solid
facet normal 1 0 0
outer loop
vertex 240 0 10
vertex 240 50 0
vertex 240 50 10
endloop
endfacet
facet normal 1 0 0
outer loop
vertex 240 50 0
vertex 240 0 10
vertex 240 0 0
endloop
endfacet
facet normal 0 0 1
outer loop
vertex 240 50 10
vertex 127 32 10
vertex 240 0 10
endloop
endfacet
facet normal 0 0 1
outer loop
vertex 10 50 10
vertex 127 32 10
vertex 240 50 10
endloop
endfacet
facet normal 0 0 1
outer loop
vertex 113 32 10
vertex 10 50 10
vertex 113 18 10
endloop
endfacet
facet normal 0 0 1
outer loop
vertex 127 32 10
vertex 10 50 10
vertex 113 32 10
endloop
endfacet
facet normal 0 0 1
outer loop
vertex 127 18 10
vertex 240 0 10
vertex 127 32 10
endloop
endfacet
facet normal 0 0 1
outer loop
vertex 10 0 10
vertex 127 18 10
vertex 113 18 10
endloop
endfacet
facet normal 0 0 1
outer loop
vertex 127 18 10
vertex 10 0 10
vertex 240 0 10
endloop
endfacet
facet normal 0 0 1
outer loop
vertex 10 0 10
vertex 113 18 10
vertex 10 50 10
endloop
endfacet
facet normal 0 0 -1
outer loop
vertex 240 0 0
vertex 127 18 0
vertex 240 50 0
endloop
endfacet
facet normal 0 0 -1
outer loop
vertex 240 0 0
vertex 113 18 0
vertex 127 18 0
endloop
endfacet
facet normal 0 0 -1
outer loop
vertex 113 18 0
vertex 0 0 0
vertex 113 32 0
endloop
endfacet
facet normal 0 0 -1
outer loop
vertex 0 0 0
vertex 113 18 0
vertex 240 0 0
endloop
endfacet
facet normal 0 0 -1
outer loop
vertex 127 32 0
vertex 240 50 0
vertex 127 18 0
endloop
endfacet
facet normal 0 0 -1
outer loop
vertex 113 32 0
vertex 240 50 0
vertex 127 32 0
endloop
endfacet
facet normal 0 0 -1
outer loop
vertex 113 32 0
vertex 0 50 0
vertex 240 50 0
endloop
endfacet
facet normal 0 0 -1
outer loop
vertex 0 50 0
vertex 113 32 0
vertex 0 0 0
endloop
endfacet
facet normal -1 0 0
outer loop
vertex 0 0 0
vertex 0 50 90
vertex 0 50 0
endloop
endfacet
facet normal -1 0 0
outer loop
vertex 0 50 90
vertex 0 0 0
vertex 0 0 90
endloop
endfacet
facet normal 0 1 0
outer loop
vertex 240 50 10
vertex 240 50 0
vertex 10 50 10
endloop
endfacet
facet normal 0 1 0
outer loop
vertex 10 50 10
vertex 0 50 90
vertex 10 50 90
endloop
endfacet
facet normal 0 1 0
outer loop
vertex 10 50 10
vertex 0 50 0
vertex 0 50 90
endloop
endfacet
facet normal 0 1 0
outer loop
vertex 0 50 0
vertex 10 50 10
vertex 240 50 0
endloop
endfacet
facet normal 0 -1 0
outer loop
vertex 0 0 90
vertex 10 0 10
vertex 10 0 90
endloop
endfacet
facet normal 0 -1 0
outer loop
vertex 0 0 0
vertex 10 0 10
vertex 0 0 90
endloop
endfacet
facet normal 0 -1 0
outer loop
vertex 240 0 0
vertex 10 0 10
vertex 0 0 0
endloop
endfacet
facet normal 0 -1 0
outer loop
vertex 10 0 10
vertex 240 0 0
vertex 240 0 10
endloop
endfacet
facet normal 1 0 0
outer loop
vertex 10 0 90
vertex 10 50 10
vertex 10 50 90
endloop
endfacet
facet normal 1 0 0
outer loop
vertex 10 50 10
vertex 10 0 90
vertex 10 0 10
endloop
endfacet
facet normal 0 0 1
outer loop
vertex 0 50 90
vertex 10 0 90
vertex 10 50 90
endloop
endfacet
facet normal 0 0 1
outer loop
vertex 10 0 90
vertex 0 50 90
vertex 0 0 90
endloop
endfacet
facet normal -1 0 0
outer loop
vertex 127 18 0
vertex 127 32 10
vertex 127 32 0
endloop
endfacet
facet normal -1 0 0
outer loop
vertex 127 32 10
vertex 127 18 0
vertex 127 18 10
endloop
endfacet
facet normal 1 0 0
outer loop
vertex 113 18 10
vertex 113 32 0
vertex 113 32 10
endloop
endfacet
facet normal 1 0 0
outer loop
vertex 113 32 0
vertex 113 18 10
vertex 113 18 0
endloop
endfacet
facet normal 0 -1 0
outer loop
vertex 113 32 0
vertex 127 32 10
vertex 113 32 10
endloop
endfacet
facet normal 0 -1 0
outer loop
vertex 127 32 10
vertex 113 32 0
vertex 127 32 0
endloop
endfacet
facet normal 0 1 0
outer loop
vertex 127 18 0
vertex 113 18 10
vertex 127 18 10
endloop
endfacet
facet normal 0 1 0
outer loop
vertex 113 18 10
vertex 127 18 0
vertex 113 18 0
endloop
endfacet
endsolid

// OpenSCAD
$fn = 32;

// ----------------------------------------------------------------------
// Gantry bracket: 200-250 mm L bracket
// ----------------------------------------------------------------------

// --- parameters (mm) ---
base_l = 240;             // base arm length, X
arm_w = 50;               // arm width, Y
thick = 10;               // arm thickness
up_h = 80;                // vertical arm height, Z
slot_w = 14;              // adjustment slot width in the base

total_h = up_h + thick;  // overall height

difference() {
  union() {
    cube([base_l, arm_w, thick]);
    cube([thick, arm_w, total_h]);
  }
  translate([base_l / 2 - slot_w / 2, arm_w / 2 - slot_w / 2, -1])
    cube([slot_w, slot_w, thick + 2]);
}
